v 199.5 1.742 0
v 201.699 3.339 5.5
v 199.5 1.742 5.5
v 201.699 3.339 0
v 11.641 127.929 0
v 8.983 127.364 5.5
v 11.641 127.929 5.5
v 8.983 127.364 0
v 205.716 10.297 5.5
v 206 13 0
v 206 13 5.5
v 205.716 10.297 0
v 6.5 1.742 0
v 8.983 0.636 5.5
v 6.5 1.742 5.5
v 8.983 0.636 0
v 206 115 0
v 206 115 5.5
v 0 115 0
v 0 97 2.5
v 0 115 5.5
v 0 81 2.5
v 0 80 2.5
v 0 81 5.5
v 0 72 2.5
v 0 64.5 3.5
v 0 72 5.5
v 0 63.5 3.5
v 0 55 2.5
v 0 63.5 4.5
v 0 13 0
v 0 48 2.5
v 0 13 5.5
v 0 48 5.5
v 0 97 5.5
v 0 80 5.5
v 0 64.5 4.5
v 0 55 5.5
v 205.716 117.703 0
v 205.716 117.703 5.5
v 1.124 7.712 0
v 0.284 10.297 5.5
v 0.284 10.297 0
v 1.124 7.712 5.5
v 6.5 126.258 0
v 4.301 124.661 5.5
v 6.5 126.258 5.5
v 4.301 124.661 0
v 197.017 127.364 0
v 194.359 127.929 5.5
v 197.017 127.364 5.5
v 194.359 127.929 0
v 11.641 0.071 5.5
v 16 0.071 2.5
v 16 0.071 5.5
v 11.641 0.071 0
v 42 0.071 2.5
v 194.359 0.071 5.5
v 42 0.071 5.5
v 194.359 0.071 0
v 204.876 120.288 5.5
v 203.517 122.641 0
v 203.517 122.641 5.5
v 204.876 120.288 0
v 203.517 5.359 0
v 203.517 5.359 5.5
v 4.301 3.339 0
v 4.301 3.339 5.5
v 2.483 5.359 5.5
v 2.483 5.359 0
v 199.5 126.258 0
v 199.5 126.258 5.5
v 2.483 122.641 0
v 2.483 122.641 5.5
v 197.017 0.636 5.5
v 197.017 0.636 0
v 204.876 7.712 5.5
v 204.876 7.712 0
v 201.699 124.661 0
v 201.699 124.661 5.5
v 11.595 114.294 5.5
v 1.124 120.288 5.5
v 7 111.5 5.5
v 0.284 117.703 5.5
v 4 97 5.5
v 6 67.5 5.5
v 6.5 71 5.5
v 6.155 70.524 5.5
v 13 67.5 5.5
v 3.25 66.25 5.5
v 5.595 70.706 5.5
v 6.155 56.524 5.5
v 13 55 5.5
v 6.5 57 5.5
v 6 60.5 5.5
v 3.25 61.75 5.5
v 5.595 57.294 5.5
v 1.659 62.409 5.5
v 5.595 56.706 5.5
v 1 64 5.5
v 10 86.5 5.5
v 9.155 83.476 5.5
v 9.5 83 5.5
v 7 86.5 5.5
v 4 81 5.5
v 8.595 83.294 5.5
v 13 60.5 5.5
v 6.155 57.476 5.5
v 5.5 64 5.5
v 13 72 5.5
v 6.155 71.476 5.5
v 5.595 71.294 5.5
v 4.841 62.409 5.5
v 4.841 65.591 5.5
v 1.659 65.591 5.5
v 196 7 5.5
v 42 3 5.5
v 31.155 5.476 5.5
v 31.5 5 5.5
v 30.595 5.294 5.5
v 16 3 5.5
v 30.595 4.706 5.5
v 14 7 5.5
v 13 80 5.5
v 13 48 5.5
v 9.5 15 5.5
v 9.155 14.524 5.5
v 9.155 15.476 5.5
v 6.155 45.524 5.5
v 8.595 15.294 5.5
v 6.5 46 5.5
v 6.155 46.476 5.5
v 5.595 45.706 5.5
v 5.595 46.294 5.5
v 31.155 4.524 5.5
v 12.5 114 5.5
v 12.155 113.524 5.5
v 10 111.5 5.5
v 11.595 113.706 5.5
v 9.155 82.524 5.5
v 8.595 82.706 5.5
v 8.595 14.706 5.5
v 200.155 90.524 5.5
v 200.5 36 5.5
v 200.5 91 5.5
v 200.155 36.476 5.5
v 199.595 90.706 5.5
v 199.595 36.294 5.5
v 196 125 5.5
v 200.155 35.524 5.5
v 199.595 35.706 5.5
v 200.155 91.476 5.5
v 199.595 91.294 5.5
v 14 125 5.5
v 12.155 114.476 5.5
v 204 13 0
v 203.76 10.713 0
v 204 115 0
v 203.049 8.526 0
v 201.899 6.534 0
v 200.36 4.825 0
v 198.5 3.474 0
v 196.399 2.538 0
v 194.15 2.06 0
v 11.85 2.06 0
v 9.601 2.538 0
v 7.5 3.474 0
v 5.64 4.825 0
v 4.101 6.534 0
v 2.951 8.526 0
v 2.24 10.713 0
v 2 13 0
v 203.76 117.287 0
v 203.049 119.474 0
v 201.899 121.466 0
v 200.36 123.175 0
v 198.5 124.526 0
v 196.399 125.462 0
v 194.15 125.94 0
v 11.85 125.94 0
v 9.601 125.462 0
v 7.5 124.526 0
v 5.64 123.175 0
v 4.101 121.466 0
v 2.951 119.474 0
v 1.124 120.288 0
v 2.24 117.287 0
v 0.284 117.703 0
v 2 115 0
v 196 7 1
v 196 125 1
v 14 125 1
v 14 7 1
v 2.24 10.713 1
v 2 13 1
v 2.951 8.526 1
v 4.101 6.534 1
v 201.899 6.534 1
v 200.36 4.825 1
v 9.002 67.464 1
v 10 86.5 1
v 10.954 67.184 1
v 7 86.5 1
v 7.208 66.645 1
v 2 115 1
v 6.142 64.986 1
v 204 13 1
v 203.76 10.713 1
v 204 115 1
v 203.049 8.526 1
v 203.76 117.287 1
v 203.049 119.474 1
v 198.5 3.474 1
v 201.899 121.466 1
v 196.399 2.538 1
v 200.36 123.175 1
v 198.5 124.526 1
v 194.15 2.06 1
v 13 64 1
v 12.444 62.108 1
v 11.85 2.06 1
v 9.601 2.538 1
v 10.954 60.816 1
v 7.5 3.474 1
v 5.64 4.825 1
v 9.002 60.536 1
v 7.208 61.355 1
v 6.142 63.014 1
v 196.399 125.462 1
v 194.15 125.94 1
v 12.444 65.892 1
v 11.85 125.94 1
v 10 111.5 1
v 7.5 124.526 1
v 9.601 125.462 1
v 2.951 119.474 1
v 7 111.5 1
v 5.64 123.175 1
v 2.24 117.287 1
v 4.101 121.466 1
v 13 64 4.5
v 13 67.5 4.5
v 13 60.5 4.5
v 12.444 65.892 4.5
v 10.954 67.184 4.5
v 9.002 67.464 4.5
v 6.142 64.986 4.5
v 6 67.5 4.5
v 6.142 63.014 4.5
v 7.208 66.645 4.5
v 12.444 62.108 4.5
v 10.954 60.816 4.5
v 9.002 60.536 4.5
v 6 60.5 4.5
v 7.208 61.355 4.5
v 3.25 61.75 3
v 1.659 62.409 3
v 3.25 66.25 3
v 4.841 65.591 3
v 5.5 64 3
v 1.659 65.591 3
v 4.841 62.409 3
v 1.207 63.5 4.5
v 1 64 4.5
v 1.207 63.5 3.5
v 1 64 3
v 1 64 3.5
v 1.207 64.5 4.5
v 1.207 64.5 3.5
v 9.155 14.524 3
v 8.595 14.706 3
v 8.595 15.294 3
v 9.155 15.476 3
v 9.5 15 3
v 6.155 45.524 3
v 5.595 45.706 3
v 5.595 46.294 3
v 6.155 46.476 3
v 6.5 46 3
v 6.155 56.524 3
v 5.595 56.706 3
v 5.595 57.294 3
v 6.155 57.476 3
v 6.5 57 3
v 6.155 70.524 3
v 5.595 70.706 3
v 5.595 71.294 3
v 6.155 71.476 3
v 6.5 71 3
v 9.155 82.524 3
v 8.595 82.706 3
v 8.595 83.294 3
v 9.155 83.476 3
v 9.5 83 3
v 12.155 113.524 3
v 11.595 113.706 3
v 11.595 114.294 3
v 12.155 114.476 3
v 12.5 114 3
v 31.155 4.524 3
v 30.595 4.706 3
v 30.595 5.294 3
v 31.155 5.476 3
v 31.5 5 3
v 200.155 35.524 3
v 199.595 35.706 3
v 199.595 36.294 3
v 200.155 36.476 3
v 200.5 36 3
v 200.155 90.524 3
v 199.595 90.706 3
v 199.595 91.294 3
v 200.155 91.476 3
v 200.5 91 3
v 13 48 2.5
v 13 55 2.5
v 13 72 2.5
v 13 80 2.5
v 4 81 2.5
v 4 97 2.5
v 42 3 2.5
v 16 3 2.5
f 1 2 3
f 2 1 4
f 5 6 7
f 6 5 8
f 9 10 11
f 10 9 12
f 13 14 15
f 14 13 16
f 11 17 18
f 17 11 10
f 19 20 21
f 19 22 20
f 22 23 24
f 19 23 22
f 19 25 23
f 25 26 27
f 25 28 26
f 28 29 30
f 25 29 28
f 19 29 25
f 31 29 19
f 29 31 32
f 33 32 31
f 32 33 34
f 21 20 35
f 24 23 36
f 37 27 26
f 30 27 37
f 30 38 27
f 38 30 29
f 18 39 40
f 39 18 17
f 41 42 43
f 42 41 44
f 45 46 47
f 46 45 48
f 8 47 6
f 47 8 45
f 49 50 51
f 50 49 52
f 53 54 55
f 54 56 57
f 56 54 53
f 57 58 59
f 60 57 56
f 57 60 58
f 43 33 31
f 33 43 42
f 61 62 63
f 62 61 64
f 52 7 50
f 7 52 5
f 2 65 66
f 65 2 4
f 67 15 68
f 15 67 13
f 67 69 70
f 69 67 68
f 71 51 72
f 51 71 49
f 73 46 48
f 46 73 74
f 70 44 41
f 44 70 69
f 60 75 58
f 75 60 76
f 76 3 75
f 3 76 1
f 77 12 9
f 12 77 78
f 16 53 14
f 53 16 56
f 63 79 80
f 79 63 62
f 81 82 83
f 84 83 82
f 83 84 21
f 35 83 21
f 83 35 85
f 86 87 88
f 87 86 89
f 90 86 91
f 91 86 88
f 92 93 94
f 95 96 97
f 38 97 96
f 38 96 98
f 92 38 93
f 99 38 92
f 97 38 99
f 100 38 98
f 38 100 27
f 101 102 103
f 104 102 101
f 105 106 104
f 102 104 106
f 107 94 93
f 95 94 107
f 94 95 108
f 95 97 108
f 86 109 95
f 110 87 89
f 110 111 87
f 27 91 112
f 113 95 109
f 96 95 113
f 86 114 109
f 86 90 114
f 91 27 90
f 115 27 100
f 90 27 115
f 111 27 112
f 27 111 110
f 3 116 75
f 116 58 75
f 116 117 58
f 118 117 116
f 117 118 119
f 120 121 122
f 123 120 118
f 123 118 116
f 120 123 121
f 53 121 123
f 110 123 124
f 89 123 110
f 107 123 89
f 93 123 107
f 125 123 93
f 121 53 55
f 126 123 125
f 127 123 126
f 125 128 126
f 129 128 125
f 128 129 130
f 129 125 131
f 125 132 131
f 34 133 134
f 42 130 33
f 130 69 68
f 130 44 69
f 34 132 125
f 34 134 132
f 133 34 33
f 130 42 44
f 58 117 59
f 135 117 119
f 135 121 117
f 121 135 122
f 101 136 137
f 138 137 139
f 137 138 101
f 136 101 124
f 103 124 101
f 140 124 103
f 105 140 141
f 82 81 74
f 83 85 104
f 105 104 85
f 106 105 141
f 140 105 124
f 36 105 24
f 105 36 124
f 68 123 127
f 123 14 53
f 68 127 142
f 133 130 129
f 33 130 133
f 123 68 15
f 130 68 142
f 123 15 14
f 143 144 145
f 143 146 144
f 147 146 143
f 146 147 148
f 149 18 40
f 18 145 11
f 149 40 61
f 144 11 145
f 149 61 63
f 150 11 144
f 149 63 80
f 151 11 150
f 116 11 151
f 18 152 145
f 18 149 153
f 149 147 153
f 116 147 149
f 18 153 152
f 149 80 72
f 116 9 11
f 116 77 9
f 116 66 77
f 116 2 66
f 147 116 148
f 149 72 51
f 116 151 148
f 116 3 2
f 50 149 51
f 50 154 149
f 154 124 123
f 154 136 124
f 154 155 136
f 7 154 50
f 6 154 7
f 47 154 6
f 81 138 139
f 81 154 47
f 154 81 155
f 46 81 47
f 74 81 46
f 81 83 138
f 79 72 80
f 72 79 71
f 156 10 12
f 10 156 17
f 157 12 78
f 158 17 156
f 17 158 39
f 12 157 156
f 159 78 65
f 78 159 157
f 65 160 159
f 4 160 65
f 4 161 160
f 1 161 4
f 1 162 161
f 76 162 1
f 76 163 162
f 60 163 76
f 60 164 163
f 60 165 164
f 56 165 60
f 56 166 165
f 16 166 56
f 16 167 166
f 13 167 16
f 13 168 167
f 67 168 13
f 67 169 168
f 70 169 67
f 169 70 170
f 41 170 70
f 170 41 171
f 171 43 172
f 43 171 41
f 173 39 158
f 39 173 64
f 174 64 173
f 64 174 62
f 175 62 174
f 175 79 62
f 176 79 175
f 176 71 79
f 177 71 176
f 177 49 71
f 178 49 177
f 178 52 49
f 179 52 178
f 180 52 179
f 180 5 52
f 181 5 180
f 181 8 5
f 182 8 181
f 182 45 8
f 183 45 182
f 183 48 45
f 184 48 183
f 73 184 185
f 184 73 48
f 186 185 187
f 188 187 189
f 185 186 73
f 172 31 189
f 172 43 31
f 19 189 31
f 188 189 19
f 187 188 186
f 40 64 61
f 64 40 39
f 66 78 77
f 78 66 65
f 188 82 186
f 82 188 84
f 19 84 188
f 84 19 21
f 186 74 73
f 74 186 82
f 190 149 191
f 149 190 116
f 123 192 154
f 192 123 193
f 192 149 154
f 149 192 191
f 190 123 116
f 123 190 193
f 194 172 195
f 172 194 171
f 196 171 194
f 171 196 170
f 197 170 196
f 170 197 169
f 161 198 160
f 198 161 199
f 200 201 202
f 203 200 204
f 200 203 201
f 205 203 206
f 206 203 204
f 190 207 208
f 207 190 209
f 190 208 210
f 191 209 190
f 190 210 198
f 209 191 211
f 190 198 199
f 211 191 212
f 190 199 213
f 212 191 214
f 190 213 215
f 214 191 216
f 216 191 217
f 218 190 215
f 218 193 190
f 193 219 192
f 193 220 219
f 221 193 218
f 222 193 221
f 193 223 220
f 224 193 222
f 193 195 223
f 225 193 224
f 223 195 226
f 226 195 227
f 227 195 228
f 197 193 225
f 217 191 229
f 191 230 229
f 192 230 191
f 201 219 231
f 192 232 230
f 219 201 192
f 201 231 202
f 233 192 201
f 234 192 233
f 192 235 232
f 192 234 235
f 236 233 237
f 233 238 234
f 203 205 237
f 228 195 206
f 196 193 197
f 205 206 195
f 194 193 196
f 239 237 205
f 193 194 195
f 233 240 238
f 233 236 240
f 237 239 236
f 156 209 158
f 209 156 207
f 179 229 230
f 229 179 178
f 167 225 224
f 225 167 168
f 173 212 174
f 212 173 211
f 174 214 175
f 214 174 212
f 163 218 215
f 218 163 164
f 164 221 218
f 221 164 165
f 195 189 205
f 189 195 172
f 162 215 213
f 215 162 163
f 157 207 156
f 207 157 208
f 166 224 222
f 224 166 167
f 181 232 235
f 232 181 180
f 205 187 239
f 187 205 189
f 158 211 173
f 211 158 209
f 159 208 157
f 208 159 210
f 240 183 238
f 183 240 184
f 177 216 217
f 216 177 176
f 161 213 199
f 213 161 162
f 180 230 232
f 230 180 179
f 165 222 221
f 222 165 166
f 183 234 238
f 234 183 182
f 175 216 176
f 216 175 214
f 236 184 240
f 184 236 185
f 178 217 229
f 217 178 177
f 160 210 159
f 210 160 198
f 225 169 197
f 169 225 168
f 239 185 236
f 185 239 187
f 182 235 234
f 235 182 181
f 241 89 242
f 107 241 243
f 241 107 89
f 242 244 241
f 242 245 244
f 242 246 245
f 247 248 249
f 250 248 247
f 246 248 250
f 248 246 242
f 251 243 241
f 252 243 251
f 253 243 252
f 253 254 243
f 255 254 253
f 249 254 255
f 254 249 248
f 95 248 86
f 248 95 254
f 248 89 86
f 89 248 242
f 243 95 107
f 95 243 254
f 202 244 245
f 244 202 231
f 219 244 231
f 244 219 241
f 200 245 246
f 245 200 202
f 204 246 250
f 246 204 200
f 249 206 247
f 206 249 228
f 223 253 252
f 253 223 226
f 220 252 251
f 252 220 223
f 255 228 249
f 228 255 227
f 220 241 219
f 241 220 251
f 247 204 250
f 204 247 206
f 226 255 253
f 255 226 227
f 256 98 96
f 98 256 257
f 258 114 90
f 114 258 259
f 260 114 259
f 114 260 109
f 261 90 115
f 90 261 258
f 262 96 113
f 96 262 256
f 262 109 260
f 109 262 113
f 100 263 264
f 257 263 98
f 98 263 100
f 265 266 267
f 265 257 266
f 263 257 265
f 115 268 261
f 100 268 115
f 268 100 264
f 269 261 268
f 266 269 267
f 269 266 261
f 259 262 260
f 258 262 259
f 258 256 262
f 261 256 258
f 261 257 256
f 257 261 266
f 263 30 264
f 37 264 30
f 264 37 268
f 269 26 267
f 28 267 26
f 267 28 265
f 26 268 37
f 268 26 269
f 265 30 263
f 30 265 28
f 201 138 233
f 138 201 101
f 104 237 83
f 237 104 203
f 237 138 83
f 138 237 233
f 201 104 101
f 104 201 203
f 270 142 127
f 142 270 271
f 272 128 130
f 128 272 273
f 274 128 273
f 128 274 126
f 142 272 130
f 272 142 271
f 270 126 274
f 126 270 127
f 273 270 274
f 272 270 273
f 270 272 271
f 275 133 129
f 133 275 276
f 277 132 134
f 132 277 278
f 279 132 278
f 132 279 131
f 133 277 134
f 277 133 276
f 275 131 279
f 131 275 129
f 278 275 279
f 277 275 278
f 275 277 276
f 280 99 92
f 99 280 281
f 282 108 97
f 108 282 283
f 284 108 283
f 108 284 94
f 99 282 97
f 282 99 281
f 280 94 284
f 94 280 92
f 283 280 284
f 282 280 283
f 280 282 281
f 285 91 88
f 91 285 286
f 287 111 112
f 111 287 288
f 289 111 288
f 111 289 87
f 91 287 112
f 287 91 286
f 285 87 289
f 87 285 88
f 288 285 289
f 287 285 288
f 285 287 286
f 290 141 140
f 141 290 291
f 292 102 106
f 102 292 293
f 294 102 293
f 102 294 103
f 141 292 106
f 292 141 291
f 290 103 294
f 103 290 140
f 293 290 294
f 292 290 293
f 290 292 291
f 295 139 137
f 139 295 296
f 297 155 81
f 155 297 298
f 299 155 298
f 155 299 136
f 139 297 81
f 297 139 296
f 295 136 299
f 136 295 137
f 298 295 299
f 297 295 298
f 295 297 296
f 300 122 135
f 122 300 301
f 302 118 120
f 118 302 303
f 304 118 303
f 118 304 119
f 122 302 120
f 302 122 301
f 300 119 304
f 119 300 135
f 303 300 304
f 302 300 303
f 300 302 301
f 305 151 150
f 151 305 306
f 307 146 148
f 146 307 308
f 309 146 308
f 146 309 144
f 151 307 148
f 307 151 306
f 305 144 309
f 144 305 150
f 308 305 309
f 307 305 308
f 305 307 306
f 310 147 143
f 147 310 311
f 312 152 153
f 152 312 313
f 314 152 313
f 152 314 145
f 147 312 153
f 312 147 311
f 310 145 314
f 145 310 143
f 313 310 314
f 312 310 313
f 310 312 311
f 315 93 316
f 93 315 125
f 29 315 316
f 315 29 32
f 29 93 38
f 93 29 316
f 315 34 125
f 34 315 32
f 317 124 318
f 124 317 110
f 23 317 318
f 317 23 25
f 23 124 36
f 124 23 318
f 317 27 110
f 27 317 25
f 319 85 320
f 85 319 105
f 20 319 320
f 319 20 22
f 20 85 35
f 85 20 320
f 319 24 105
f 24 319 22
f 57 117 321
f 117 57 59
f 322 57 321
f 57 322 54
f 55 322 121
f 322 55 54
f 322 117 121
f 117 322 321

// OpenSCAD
caseWidth = 128;
caseLength = 206;
caseRadius = 13;
caseHeight = 5.5;
caseScreenBorder = 2;
caseScreenRadius = caseRadius - caseScreenBorder;
caseScreenHeight = 1;
caseIntRectWidth = 118;
caseIntRectLength = 182;

difference(){
    translate([0,0,0]){
        rad = caseRadius;
        width = caseWidth;
        length = caseLength;
        height = caseHeight;
        hull() {
        for (t =  [[rad,rad,0],[length-rad,rad,0],[length-rad,width-rad,0],[rad,width-rad,0]])
            translate(t) {
                cylinder(r=rad, h=height);
            }
        }
    }
    translate([14,7,0]){
        cube([caseIntRectLength,caseIntRectWidth,caseHeight]);
    }
    translate([caseScreenBorder,caseScreenBorder,0]){
        rad = caseScreenRadius;
        width = caseWidth-2*caseScreenBorder;
        length = caseLength-2*caseScreenBorder;
        height = caseScreenHeight;
        hull() {
        for (t =  [[rad,rad,0],[length-rad,rad,0],[length-rad,width-rad,0],[rad,width-rad,0]])
            translate(t) {
                cylinder(r=rad, h=height);
            }
        }
    }
    translate([6,60.5,caseHeight-1]){
        cube([7,7,1]);
    }
    translate([6+7/2,60.5+7/2]){
        cylinder(d=7, h=caseHeight);
    }
    translate([1+4.5/2,60.5+7/2,caseHeight-2.5]){
        cylinder(d=4.5, h=2.5);
    }
    translate([0,60.5+6/2,caseHeight-2]){
        cube([2,1,1]);
    }
    translate([7,86.5,0]){
        cube([3,25,caseHeight]);
    }
    translate([9,15,caseHeight-2.5]){
        cylinder(d=1, h=2.5);
    }
    translate([6,46,caseHeight-2.5]){
        cylinder(d=1, h=2.5);
    }
    translate([6,57,caseHeight-2.5]){
        cylinder(d=1, h=2.5);
    }
    translate([6,71,caseHeight-2.5]){
        cylinder(d=1, h=2.5);
    }
    translate([9,83,caseHeight-2.5]){
        cylinder(d=1, h=2.5);
    }
    translate([12,114,caseHeight-2.5]){
        cylinder(d=1, h=2.5);
    }
    translate([31,5,caseHeight-2.5]){
        cylinder(d=1, h=2.5);
    }
    translate([caseLength-6,36,caseHeight-2.5]){
        cylinder(d=1, h=2.5);
    }
    translate([caseLength-6,91,caseHeight-2.5]){
        cylinder(d=1, h=2.5);
    }
    
    translate([0,48,caseHeight-3]){
        cube([13,7,3]);
    }
    
    translate([0,72,caseHeight-3]){
        cube([13,8,3]);
    }

    translate([0,81,caseHeight-3]){
        cube([4,16,3]);
    }

    translate([16,0,caseHeight-3]){
        cube([26,3,3]);
    }
}
